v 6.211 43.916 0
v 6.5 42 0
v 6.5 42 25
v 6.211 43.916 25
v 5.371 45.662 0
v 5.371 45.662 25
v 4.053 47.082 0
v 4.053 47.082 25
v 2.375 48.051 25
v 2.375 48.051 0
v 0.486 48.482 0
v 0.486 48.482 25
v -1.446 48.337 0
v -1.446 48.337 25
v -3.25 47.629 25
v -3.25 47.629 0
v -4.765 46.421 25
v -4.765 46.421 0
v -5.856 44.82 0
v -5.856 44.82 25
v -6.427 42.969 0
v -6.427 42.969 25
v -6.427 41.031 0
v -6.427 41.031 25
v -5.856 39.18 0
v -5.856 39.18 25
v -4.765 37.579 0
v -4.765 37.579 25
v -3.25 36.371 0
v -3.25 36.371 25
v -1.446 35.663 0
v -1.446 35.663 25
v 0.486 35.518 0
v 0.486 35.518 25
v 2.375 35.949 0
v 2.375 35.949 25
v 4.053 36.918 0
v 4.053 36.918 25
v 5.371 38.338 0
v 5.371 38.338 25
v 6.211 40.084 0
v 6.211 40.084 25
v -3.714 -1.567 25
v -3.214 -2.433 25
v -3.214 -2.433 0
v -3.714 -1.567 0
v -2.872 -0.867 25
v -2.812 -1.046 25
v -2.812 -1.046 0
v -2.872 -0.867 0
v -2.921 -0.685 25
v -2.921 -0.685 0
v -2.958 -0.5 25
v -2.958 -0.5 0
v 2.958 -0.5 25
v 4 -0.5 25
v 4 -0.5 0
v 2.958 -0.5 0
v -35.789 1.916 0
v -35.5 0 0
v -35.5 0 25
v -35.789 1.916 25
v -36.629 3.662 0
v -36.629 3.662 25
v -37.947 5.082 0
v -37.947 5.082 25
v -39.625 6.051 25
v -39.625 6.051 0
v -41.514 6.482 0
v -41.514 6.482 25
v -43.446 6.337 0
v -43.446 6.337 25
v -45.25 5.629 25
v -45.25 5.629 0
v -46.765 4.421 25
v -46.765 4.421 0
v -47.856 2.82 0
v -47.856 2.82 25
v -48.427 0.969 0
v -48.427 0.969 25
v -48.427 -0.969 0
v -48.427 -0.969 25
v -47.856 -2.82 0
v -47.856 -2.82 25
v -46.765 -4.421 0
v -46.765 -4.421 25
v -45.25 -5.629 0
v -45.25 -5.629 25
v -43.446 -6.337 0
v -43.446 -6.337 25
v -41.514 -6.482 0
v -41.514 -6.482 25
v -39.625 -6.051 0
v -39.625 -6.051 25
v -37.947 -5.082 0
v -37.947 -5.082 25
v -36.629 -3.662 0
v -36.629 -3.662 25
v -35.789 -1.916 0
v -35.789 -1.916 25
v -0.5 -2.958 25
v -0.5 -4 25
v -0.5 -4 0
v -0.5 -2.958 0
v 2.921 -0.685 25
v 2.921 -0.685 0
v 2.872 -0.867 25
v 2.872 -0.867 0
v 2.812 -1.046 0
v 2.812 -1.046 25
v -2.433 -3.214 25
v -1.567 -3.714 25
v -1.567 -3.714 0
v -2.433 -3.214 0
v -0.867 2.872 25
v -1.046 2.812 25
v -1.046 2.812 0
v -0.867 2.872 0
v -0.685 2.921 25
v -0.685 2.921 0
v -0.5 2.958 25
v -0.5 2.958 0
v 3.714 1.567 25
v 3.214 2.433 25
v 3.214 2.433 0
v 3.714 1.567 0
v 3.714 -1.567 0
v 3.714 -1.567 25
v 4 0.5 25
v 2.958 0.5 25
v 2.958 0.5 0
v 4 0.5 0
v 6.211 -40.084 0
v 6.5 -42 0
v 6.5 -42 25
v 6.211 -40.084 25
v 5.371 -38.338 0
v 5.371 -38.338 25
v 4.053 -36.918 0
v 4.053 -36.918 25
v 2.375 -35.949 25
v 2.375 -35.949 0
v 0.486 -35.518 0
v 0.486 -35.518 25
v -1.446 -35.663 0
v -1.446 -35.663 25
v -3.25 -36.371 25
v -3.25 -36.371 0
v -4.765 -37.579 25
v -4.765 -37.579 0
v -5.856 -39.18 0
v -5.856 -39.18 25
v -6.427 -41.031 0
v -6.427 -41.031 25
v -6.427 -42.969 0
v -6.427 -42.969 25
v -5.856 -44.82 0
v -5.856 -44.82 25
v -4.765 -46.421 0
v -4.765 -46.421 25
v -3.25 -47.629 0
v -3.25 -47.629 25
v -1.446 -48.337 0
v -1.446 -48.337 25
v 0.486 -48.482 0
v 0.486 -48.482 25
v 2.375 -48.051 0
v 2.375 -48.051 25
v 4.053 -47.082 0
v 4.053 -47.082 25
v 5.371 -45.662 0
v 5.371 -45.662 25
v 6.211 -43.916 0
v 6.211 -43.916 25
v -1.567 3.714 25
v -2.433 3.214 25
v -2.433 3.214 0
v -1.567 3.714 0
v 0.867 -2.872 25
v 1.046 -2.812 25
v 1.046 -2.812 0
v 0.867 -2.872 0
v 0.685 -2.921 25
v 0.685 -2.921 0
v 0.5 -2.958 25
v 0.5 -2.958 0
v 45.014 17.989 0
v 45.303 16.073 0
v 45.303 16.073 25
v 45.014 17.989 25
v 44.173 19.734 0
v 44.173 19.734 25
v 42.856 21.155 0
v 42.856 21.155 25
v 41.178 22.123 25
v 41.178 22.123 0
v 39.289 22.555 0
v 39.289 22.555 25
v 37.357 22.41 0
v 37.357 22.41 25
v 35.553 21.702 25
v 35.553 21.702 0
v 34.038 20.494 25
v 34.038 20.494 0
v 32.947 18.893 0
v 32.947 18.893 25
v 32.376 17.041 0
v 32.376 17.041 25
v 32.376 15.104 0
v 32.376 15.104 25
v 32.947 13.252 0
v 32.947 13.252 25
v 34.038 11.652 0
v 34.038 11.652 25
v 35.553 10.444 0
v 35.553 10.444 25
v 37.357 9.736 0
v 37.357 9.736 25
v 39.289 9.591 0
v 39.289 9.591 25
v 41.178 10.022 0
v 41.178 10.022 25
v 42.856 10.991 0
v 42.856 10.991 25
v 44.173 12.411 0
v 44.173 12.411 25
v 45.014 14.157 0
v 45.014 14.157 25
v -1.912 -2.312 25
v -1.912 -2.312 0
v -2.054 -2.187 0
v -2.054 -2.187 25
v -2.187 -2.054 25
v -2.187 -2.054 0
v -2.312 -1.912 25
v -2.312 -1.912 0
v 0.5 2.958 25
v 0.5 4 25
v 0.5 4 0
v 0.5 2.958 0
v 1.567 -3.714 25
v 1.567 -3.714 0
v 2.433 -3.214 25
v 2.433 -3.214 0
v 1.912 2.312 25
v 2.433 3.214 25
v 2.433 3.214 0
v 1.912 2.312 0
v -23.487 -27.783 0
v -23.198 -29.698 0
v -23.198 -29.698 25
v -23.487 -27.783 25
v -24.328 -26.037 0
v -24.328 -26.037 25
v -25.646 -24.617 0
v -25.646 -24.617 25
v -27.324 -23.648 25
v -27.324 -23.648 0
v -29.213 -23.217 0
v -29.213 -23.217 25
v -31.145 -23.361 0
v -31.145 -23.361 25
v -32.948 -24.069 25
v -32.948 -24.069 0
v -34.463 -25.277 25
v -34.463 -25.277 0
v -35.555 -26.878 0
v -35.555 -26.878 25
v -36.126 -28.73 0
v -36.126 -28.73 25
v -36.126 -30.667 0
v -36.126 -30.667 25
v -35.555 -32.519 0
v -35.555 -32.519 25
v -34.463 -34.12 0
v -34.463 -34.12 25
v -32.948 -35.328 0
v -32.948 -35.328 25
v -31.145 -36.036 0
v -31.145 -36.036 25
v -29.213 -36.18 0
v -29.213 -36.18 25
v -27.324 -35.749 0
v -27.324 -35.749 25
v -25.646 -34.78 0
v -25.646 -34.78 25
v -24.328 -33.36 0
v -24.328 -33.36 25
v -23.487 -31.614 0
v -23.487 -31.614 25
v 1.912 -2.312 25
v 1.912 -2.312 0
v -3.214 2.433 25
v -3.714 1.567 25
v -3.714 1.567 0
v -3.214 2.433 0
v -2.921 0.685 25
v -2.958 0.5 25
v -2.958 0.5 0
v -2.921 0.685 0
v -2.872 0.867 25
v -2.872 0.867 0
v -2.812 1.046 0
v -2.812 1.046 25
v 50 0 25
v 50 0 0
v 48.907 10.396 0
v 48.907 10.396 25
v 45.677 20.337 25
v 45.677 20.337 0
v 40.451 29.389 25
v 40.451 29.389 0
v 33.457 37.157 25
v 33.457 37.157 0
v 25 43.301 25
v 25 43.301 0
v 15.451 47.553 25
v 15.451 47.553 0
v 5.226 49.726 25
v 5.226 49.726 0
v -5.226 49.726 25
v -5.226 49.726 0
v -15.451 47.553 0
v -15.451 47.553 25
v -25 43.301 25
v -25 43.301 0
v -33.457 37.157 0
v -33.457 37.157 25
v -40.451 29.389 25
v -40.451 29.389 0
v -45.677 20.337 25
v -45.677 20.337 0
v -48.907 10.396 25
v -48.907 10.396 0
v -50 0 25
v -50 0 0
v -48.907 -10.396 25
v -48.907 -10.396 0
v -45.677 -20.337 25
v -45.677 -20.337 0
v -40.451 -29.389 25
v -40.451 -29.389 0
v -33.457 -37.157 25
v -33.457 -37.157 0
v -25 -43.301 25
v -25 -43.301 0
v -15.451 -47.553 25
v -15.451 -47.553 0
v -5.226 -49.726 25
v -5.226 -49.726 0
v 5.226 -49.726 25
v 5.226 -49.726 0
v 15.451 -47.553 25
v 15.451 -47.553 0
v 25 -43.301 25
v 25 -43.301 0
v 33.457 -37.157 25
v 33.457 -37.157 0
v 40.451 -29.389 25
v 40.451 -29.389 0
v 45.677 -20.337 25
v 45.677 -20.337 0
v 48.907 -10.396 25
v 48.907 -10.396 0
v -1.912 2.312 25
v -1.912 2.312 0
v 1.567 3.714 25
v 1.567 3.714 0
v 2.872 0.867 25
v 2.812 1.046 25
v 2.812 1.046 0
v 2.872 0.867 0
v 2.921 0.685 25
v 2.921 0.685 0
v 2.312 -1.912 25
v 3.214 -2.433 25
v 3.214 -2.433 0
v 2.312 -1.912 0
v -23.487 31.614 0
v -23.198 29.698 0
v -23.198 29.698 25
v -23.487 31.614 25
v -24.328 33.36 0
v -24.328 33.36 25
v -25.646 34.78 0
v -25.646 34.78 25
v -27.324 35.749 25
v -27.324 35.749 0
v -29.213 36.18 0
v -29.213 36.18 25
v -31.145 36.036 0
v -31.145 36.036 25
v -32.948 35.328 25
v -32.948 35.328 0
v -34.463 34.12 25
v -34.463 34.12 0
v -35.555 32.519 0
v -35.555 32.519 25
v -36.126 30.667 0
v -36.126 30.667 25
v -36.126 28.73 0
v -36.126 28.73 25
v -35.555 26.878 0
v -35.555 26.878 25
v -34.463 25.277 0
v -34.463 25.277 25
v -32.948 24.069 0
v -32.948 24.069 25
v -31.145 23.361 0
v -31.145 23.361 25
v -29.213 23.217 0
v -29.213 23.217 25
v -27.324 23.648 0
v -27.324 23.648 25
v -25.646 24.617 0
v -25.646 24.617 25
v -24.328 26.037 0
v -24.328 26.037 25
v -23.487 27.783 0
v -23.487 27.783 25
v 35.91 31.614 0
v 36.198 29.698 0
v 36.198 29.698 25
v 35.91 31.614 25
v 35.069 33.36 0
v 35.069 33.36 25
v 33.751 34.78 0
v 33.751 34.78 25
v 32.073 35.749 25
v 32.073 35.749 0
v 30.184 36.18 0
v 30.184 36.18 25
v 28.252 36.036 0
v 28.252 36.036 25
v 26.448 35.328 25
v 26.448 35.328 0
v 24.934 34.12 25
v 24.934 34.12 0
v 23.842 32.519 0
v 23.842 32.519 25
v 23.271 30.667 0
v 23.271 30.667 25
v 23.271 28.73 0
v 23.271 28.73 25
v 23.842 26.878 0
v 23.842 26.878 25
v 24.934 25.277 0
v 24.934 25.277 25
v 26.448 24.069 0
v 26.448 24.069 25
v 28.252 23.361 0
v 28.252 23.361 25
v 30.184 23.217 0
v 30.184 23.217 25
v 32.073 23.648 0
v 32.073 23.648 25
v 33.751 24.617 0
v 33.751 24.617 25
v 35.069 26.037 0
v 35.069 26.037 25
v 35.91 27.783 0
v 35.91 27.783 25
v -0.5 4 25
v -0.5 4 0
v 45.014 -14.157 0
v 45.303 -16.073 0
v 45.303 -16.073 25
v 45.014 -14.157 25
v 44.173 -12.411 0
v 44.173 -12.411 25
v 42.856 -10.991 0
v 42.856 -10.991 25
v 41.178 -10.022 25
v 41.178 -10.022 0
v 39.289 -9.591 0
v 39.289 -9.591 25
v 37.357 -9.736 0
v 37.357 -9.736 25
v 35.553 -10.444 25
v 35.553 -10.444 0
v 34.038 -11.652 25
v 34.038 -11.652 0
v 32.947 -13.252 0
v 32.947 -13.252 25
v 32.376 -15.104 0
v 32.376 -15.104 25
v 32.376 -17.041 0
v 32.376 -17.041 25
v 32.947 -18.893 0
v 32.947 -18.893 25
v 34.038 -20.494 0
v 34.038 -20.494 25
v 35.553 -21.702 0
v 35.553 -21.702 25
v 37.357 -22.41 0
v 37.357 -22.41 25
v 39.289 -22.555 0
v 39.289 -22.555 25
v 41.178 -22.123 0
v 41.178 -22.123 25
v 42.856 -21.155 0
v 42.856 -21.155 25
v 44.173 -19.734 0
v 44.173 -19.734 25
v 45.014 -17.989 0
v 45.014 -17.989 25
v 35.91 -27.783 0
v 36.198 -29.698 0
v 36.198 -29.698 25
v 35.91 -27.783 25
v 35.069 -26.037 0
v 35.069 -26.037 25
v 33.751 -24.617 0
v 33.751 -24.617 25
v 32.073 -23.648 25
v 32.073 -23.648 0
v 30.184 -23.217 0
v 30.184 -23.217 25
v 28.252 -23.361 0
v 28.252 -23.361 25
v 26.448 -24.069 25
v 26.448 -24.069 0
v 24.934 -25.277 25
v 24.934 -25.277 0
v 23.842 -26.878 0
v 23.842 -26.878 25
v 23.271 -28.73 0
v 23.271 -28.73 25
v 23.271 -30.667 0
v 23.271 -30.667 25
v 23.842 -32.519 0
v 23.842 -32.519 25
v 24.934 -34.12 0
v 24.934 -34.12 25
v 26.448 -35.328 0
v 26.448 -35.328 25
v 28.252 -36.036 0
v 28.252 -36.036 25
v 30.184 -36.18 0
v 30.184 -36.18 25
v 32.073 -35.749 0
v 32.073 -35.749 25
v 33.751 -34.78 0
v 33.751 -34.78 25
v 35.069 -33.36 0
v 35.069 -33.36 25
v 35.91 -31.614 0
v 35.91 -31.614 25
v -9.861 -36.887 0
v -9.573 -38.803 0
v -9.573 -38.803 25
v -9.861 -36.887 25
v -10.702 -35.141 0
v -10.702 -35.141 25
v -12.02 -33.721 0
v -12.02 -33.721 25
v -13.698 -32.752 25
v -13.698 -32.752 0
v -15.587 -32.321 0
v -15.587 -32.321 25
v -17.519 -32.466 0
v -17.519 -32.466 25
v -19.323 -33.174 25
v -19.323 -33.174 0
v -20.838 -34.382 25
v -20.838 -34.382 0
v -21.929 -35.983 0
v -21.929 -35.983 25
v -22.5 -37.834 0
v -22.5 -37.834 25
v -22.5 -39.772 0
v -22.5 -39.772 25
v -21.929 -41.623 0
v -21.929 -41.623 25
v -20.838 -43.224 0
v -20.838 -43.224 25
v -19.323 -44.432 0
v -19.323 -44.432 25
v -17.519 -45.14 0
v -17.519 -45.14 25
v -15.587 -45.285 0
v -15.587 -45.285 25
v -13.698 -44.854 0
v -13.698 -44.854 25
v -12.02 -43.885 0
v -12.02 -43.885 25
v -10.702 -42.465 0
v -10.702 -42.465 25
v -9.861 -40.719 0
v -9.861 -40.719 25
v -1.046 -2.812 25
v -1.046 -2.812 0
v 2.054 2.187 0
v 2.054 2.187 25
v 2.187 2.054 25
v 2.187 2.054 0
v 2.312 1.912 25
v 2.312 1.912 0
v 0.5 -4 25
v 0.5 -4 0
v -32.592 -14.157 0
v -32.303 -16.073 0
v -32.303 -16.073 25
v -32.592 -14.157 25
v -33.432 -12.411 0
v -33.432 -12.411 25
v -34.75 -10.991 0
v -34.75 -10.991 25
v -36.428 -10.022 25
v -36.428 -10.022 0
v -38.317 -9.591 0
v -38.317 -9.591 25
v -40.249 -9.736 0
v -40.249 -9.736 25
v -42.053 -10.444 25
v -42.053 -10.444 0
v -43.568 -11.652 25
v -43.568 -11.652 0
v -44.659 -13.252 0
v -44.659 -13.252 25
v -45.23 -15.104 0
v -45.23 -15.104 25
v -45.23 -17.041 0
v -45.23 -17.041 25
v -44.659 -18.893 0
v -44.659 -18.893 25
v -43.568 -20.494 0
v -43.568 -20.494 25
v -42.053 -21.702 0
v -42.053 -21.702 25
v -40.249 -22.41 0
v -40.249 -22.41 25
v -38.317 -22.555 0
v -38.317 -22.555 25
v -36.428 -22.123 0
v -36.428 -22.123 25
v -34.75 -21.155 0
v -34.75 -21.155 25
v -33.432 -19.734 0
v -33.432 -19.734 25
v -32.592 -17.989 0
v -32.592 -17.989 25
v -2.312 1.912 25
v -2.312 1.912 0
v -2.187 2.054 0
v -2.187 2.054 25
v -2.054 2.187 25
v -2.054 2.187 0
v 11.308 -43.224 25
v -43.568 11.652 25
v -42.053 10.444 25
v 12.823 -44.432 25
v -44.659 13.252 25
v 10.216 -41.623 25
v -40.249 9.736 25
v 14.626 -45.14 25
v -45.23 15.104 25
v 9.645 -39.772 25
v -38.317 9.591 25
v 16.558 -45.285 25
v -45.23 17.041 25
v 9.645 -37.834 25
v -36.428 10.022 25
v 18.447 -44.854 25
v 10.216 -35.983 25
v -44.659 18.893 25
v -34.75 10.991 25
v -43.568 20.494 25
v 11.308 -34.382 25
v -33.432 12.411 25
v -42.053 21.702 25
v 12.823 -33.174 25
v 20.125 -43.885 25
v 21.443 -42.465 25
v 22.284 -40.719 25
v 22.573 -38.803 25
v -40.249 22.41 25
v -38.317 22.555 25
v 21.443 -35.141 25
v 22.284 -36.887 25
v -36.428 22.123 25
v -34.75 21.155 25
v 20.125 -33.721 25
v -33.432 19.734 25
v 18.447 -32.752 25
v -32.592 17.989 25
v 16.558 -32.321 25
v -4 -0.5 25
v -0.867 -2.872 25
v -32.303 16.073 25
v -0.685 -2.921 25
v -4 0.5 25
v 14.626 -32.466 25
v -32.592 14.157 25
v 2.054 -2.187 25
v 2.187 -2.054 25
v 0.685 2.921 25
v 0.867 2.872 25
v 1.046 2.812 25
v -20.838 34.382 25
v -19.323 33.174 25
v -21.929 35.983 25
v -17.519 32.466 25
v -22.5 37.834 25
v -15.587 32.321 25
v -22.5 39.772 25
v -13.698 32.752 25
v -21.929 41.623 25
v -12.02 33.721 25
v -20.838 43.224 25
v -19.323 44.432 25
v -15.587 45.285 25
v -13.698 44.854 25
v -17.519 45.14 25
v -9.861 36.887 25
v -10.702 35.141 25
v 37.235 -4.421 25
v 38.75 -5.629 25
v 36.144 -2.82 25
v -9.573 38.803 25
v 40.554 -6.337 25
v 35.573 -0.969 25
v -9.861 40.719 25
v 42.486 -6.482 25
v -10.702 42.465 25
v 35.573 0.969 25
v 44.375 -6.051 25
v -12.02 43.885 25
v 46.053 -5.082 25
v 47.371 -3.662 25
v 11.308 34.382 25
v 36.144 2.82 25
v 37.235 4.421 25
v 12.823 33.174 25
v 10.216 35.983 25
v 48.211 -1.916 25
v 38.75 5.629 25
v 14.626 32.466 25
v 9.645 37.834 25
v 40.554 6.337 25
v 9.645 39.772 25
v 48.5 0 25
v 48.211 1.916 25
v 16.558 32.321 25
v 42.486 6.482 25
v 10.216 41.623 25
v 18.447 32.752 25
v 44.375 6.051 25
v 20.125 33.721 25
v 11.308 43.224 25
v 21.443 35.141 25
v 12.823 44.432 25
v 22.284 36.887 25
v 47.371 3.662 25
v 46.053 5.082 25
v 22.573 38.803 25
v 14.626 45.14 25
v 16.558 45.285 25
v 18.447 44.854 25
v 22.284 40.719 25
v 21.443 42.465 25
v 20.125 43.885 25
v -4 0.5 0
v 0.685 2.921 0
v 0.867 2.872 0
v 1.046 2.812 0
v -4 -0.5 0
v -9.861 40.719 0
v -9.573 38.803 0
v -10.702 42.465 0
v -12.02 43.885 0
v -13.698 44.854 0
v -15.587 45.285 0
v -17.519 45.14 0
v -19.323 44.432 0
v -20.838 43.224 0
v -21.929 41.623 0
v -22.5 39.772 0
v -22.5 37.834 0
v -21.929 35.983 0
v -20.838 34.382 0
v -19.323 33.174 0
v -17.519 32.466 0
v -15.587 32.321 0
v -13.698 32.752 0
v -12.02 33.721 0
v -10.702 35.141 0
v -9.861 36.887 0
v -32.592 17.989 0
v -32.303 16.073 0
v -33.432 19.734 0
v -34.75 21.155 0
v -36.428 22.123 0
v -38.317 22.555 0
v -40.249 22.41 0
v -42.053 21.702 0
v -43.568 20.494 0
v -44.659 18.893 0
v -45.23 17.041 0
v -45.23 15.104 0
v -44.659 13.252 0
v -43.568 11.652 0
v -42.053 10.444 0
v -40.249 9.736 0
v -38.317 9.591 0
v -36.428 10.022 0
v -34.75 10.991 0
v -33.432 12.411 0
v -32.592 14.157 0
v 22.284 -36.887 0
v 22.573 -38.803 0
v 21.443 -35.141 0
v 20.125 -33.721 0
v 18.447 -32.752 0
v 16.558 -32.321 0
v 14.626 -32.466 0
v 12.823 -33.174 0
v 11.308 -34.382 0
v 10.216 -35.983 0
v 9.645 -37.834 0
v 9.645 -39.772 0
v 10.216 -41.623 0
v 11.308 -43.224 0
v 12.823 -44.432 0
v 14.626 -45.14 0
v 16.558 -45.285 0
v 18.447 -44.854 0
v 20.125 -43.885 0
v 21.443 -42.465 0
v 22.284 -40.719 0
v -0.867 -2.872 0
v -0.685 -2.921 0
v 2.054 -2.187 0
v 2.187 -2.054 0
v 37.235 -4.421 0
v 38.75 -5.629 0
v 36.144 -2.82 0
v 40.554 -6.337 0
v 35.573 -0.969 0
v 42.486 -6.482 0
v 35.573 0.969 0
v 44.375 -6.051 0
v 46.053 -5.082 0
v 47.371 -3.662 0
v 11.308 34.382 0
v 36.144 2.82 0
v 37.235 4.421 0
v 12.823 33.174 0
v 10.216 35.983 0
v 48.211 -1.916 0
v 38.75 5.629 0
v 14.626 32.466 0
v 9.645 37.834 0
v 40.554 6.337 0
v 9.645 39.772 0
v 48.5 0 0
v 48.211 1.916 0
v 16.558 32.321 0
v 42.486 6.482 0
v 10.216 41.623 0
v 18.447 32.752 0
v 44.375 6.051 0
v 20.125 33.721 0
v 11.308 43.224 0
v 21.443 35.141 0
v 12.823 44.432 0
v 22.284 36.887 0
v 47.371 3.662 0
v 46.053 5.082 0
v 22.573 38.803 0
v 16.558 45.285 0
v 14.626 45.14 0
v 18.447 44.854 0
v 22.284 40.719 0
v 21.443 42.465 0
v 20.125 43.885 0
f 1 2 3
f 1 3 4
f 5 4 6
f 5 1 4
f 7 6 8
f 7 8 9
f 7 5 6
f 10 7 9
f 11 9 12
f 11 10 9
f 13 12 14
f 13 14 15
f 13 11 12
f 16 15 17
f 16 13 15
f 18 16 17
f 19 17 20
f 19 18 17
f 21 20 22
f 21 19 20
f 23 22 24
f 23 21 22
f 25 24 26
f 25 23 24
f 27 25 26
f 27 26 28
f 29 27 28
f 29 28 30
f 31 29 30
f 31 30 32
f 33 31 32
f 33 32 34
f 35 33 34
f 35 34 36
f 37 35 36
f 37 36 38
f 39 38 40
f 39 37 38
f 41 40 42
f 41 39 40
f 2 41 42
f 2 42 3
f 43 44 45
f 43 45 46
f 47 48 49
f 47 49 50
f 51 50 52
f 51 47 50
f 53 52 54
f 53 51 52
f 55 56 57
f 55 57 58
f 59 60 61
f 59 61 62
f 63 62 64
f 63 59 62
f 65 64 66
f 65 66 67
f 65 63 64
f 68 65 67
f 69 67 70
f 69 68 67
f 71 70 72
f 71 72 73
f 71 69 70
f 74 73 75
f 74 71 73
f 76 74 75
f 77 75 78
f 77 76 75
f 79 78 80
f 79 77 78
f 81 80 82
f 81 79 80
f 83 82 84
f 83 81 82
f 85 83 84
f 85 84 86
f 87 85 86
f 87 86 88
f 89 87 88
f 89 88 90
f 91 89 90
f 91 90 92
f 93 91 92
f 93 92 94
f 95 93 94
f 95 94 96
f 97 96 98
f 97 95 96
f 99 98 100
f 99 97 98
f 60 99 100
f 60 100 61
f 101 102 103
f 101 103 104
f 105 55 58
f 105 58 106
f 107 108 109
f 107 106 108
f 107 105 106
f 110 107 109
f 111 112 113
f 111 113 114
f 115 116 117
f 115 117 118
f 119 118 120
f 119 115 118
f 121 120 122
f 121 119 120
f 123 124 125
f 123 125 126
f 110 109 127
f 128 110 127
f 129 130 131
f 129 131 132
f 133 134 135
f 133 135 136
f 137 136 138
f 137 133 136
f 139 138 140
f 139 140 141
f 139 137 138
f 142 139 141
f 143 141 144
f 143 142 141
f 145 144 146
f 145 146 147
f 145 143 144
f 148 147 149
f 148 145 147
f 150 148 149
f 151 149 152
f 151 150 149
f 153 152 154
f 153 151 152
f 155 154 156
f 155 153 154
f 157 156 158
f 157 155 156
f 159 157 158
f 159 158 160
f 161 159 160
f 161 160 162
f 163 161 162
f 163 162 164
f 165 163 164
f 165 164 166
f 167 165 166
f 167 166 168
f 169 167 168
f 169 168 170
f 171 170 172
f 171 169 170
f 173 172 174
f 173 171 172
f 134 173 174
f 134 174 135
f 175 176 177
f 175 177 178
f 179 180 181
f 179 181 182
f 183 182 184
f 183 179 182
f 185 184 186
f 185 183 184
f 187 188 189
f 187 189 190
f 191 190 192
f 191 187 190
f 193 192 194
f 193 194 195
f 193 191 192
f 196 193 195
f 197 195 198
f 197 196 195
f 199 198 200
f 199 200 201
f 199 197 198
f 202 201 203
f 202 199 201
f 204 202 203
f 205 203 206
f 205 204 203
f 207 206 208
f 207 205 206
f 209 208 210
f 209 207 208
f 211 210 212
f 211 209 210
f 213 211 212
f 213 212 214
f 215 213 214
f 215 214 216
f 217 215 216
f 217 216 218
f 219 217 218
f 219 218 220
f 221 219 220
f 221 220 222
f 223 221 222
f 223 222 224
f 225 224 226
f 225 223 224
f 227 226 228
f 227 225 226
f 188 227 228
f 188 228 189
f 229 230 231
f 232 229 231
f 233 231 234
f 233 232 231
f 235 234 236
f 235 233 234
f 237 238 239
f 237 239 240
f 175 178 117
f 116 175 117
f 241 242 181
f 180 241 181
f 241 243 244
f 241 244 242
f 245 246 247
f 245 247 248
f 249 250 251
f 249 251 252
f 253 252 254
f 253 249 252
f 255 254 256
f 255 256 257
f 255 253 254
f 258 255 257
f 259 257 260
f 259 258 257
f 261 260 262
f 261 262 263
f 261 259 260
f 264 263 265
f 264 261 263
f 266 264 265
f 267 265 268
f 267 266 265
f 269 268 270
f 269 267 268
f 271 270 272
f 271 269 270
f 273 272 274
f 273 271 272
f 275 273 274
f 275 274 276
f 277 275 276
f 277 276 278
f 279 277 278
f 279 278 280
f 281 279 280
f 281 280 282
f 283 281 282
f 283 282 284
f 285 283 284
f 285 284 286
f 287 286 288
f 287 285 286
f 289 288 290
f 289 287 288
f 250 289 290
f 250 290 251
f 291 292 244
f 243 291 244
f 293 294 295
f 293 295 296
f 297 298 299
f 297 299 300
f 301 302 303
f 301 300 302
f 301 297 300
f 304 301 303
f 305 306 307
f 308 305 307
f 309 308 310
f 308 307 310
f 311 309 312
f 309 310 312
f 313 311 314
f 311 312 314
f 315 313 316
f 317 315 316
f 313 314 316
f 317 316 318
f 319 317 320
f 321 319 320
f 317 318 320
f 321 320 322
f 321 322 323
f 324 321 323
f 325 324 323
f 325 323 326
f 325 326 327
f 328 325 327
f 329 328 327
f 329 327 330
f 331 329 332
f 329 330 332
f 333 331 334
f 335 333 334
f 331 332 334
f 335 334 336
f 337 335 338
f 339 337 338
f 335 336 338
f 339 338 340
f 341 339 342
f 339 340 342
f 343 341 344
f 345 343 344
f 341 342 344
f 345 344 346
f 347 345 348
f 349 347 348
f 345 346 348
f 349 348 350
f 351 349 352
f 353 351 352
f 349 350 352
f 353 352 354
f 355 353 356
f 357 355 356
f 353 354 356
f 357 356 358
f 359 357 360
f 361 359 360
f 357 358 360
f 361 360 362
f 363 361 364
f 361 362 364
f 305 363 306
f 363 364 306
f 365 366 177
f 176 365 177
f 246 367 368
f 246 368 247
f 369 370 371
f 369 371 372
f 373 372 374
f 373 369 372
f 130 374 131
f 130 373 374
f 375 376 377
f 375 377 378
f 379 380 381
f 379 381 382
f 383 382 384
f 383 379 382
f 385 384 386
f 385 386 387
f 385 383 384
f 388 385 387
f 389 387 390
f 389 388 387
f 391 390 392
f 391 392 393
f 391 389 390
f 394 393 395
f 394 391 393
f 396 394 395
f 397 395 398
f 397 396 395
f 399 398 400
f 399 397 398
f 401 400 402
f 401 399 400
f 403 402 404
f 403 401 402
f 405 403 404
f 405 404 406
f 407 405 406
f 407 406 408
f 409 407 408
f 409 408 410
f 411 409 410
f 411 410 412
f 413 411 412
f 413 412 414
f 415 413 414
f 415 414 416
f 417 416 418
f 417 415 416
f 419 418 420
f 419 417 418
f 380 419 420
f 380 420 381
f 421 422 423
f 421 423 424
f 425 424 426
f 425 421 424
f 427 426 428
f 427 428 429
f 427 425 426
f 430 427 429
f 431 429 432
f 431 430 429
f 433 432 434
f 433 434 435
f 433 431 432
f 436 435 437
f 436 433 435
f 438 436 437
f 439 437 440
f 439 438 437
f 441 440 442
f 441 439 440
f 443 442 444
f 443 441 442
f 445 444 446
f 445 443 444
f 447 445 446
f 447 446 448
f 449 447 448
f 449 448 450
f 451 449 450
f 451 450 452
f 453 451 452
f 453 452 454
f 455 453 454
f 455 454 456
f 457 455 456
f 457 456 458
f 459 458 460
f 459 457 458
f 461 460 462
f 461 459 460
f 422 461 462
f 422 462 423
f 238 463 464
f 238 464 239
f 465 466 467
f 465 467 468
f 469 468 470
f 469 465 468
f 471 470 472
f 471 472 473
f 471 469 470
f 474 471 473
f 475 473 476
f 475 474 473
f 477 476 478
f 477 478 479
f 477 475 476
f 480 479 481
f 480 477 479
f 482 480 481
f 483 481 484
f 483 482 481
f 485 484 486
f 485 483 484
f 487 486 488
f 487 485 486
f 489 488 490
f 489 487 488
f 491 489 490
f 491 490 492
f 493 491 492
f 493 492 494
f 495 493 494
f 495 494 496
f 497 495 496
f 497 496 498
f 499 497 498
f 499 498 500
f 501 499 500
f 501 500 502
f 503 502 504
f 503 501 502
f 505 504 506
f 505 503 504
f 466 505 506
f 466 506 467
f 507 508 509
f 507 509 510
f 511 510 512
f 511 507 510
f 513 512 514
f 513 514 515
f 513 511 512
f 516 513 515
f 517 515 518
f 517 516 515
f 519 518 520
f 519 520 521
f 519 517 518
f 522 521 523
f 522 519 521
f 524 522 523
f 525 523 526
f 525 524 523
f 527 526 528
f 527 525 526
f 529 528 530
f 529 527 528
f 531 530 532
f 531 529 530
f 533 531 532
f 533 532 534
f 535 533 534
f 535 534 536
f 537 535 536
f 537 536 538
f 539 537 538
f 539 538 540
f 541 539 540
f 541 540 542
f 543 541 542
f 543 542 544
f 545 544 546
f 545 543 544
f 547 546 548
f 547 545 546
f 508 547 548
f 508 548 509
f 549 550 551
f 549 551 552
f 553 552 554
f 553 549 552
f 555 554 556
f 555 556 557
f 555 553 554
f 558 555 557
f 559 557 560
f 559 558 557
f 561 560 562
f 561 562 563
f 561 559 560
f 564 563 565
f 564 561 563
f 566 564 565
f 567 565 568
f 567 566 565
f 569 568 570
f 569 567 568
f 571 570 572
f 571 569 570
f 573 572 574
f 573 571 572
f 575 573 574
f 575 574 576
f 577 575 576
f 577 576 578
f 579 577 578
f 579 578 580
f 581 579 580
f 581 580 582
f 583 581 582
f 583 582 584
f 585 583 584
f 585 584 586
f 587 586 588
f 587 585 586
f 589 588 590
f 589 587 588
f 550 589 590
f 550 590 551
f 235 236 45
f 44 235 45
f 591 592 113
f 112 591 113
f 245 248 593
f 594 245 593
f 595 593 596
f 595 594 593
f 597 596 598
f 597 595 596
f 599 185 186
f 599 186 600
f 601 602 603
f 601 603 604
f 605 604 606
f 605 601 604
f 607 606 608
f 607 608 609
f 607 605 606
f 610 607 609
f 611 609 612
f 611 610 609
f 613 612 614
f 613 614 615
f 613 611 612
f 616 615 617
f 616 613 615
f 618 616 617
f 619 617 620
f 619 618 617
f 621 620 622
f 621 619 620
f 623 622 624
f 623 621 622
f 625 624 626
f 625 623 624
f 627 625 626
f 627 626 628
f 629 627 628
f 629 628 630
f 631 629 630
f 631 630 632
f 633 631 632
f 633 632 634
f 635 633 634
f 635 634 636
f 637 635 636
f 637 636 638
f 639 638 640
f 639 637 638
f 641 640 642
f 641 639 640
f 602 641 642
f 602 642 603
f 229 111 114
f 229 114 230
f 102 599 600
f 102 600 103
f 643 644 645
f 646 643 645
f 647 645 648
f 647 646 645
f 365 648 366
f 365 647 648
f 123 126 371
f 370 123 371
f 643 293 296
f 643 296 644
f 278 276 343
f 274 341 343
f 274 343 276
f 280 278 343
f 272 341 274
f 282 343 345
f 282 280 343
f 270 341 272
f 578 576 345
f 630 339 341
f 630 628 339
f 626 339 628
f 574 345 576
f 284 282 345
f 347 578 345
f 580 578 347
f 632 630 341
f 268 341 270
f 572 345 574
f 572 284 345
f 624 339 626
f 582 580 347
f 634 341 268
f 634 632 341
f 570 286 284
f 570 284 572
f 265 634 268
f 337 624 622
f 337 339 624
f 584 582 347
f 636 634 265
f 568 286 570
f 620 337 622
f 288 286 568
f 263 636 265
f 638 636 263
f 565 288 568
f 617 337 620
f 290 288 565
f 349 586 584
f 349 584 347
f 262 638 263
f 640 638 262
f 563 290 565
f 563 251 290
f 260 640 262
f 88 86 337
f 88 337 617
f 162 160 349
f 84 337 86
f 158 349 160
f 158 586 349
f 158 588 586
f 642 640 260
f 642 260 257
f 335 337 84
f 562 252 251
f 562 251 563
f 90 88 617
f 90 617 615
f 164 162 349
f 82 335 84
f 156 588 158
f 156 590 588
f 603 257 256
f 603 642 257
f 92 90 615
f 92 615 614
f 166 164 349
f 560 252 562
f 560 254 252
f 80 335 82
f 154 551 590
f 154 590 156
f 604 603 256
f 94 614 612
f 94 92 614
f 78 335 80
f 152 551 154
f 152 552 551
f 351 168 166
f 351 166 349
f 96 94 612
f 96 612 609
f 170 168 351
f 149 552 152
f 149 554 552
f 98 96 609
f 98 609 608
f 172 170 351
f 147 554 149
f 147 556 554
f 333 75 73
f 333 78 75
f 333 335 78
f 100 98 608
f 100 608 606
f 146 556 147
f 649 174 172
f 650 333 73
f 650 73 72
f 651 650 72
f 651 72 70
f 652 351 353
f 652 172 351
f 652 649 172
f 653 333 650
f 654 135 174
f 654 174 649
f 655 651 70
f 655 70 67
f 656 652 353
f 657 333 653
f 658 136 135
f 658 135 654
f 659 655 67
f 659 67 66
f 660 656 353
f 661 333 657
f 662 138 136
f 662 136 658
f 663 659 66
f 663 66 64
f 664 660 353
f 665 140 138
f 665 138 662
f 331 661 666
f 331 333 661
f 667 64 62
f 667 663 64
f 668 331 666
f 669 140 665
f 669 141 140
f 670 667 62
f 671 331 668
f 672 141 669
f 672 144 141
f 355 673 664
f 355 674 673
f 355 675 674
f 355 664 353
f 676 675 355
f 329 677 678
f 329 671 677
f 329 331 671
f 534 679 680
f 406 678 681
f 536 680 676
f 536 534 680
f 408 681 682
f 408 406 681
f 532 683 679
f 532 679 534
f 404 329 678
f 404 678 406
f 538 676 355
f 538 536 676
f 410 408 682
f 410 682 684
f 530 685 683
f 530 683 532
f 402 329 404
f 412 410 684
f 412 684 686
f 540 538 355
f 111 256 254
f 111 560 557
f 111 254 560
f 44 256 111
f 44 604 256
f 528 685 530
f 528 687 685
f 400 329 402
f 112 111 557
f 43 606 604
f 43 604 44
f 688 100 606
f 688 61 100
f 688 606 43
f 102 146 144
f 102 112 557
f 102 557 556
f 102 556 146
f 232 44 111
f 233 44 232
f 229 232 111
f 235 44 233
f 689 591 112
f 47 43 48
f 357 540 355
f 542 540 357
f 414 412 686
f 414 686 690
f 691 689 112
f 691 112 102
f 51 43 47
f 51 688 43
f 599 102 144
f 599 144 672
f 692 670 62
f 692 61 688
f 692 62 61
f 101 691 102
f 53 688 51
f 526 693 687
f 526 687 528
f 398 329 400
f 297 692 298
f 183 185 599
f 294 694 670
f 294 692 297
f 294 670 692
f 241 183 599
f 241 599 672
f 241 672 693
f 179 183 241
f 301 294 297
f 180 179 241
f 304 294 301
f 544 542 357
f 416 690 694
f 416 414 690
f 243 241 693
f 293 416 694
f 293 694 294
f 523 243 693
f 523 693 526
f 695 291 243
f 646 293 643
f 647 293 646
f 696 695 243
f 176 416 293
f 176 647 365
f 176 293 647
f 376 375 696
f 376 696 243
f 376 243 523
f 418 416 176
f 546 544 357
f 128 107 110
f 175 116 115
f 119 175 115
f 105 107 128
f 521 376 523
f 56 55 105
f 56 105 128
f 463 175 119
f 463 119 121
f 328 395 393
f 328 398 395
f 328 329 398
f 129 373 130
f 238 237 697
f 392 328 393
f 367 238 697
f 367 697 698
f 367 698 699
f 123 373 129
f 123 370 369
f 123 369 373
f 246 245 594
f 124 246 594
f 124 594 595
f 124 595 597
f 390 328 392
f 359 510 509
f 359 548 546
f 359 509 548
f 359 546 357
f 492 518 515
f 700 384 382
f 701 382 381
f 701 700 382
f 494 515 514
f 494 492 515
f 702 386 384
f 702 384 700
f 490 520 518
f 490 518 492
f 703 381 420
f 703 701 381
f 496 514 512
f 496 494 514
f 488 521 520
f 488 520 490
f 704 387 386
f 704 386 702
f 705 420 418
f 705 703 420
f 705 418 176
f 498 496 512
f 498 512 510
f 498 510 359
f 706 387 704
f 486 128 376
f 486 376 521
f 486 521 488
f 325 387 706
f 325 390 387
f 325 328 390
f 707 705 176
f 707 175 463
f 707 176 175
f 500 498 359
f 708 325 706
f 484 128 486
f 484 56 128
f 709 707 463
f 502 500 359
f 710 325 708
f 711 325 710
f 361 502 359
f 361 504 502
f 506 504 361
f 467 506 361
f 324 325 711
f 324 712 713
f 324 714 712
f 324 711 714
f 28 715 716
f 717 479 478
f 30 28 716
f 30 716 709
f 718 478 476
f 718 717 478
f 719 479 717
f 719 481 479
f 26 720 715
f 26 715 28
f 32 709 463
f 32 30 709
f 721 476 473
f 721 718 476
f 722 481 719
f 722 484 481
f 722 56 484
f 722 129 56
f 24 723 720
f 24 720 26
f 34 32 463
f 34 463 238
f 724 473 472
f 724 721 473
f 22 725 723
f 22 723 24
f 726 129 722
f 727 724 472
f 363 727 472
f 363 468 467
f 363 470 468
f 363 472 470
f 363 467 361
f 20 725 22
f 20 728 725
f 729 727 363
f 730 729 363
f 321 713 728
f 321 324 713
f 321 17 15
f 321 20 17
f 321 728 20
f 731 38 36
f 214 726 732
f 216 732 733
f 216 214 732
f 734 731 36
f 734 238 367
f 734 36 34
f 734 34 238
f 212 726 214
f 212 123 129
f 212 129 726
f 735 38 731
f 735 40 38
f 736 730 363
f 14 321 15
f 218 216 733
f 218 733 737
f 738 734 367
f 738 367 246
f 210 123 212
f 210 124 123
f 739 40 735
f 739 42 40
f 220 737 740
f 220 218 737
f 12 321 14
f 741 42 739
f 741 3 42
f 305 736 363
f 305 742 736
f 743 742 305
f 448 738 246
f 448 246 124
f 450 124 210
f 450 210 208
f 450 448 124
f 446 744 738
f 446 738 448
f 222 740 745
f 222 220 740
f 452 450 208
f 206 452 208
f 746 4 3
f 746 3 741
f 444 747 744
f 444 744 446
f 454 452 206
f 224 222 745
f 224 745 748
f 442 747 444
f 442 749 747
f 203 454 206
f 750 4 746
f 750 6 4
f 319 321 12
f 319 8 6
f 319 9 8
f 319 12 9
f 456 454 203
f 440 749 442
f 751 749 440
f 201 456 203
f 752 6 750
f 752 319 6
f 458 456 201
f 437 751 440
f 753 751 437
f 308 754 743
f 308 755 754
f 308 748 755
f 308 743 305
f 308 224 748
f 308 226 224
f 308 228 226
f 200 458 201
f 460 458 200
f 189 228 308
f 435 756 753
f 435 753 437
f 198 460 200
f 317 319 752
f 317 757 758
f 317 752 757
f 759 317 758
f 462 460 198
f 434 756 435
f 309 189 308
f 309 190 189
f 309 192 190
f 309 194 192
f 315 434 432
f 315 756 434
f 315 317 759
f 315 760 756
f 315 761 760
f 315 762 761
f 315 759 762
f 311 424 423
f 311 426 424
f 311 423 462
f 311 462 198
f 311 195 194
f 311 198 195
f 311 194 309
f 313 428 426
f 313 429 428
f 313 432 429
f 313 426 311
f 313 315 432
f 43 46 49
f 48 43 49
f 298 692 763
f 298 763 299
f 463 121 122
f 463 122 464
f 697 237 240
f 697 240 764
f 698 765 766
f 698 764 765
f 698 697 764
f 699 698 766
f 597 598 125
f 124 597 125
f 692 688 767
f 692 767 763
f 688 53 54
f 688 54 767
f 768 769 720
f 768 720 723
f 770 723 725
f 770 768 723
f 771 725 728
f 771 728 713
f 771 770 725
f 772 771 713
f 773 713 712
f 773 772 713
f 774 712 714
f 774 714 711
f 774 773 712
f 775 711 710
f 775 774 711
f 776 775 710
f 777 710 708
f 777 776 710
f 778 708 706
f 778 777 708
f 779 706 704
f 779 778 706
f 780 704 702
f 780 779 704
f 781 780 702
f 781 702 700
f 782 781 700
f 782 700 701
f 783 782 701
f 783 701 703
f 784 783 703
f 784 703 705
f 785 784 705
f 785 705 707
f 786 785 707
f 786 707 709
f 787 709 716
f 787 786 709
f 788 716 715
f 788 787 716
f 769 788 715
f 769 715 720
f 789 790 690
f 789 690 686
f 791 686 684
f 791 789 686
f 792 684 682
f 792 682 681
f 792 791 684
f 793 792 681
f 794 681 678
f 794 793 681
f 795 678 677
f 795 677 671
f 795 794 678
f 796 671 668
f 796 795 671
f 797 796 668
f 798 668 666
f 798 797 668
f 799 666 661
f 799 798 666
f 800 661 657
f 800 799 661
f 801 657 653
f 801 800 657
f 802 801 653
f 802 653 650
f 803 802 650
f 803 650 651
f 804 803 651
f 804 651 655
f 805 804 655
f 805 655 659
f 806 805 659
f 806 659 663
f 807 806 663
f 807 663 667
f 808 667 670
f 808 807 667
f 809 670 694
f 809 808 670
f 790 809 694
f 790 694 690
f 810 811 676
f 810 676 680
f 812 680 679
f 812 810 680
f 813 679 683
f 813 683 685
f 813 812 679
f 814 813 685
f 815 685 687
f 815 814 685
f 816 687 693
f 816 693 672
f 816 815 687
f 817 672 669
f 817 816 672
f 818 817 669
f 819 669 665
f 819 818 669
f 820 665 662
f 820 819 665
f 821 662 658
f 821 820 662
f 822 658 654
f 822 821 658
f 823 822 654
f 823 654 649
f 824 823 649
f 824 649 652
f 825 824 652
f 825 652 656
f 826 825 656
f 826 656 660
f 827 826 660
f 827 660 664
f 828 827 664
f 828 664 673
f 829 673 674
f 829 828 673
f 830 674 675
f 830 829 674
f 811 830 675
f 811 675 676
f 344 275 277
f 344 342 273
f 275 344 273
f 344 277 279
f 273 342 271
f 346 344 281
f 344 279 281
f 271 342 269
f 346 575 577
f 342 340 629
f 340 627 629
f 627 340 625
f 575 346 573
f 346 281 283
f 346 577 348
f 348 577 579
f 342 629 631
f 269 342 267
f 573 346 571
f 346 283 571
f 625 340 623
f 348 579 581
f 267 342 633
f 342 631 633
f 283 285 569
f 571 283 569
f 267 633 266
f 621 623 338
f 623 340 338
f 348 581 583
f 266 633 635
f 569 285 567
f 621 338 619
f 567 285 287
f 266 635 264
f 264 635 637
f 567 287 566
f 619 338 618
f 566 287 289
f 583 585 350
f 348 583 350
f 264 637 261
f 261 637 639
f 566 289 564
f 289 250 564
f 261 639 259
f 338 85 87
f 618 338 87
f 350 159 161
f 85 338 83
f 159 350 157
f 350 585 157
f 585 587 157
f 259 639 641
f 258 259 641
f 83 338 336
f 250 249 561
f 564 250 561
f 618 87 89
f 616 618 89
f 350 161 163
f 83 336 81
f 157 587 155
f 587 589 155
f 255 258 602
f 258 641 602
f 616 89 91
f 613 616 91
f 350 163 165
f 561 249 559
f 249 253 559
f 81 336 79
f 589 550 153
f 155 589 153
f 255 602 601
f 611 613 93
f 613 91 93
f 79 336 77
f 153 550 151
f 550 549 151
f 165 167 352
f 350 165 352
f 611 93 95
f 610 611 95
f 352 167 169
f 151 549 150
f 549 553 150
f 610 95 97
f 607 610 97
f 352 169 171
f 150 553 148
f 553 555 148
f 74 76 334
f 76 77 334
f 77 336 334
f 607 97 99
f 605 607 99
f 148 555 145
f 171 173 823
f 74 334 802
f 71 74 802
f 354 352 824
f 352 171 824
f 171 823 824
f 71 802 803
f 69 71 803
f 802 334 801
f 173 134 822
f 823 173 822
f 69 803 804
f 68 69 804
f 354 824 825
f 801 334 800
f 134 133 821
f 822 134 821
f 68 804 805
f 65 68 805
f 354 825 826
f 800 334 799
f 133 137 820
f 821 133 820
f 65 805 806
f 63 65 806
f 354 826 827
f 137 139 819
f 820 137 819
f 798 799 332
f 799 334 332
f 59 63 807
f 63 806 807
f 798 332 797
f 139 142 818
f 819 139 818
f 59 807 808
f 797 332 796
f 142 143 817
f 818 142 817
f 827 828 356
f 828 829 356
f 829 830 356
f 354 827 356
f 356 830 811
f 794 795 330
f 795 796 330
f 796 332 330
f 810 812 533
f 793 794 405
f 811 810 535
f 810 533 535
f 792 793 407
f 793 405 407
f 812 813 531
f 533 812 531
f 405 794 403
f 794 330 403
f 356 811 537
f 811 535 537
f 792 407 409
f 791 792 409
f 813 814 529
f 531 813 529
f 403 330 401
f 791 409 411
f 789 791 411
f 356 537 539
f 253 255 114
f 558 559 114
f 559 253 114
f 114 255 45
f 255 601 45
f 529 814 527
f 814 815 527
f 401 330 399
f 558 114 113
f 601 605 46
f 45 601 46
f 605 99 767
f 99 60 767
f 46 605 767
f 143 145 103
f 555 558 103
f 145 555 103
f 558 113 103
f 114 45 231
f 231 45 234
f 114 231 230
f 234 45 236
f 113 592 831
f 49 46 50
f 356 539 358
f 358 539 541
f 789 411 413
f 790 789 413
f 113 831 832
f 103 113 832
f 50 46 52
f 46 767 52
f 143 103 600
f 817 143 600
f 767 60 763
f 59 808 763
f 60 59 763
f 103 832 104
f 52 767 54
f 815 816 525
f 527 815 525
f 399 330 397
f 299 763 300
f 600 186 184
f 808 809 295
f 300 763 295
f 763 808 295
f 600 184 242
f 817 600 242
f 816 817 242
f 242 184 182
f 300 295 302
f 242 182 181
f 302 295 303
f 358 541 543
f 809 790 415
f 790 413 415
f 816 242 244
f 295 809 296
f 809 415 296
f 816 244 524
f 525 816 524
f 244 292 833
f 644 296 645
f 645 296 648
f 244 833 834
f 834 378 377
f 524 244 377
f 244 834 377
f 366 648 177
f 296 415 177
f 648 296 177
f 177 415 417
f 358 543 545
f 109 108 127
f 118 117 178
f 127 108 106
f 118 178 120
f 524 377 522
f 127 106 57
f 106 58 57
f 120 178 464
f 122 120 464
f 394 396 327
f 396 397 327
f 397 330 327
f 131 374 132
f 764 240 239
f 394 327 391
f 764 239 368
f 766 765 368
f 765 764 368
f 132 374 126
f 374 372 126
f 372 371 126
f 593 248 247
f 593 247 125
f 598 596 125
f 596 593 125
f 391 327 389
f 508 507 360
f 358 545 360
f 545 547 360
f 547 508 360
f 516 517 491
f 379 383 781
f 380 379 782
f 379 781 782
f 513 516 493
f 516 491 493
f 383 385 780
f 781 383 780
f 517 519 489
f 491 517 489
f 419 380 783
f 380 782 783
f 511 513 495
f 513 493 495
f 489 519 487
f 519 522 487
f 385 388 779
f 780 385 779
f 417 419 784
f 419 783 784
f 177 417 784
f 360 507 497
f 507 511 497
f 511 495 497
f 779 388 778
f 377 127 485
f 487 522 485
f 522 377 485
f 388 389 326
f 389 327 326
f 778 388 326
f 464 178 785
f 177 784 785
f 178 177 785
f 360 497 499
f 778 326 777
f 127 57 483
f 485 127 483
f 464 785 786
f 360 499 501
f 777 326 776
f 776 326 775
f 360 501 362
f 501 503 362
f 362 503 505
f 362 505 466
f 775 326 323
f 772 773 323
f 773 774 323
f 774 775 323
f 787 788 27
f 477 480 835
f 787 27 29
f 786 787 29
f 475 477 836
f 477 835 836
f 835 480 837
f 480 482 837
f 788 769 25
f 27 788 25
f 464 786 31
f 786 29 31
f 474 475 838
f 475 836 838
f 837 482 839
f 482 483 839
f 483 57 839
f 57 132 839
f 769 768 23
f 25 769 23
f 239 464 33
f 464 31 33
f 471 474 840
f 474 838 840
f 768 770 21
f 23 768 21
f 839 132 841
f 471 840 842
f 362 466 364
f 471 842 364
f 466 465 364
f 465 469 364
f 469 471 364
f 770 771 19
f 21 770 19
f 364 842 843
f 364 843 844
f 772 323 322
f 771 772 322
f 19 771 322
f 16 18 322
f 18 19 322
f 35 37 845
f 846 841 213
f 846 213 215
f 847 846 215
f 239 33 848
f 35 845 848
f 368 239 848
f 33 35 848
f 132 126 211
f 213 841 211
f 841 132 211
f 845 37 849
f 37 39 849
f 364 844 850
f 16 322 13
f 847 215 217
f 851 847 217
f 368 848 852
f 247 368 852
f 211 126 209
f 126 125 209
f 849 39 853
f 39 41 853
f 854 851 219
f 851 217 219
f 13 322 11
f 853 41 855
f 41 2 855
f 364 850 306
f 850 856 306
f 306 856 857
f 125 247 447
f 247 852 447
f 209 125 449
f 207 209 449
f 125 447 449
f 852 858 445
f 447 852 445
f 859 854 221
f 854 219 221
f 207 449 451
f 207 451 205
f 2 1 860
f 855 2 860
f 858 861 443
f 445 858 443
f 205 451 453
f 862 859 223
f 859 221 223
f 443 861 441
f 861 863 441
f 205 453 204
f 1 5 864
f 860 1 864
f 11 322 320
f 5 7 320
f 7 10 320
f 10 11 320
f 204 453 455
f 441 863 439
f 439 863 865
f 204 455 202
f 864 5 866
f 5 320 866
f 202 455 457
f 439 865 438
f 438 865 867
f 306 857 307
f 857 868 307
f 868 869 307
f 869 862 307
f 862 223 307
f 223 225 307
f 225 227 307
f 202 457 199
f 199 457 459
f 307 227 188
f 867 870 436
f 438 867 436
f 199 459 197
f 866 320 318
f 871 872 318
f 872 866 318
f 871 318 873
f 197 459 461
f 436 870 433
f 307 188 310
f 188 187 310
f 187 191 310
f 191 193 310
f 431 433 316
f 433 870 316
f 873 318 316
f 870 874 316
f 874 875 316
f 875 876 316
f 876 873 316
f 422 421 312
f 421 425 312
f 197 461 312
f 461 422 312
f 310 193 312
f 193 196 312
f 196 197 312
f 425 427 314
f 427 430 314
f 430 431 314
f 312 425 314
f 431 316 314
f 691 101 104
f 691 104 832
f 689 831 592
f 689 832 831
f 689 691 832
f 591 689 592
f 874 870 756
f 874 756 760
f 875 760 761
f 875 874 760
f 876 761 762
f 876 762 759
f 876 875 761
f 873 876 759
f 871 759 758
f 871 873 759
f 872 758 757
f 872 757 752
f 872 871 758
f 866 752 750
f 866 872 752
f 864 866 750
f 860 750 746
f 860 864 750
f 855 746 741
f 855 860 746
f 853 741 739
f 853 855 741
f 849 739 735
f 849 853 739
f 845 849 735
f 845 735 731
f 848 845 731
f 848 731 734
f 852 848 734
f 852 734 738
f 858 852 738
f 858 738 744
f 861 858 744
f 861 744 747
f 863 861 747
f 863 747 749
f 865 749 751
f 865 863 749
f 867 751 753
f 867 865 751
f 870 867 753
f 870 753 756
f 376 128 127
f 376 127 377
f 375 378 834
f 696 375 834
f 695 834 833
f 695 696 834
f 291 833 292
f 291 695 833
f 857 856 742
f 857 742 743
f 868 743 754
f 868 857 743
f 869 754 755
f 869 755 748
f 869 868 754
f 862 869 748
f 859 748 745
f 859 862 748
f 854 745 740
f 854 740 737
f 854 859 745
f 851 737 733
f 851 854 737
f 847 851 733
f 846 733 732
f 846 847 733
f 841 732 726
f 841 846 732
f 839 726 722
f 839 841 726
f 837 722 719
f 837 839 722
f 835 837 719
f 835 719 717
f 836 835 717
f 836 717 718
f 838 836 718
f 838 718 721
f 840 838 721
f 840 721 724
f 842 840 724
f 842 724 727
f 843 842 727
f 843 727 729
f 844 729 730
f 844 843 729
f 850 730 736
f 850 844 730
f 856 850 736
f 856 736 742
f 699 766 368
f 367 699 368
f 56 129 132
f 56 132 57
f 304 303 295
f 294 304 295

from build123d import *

# Parameters (mm, degrees)
SKETCH2_R           = 50
SKETCH2_R_2         = 6.5
BOSS_EXTRUDE1_DEPTH = 25
CUT_EXTRUDE1_DEPTH  = 76


with BuildPart() as part:
    # Sketch2 → Boss-Extrude1 (new body)
    with BuildSketch(Plane(origin=(0, 0, 0), x_dir=(0, 1, 0), z_dir=(0, 0, 1))):
        with Locations(Location((0, 0, 0), (0, 0, 270))):
            Circle(SKETCH2_R)
        with Locations(Location((0, 42, 0), (0, 0, 270))):
            Circle(SKETCH2_R_2, mode=Mode.SUBTRACT)
        with Locations(Location((29.69848481, 29.69848481, 0), (0, 0, 270))):
            Circle(SKETCH2_R_2, mode=Mode.SUBTRACT)
        with Locations(Location((42, 0, 0), (0, 0, 270))):
            Circle(SKETCH2_R_2, mode=Mode.SUBTRACT)
        with Locations(Location((29.69848481, -29.69848481, 0), (0, 0, 270))):
            Circle(SKETCH2_R_2, mode=Mode.SUBTRACT)
        with Locations(Location((0, -42, 0), (0, 0, 270))):
            Circle(SKETCH2_R_2, mode=Mode.SUBTRACT)
        with Locations(Location((-29.69848481, -29.69848481, 0), (0, 0, 270))):
            Circle(SKETCH2_R_2, mode=Mode.SUBTRACT)
        with Locations(Location((-42, 0, 0), (0, 0, 270))):
            Circle(SKETCH2_R_2, mode=Mode.SUBTRACT)
        with Locations(Location((-29.69848481, 29.69848481, 0), (0, 0, 270))):
            Circle(SKETCH2_R_2, mode=Mode.SUBTRACT)
        with Locations(Location((-38.802940365, 16.072704159, 0), (0, 0, 270))):
            Circle(SKETCH2_R_2, mode=Mode.SUBTRACT)
        with Locations(Location((-16.072704159, 38.802940365, 0), (0, 0, 270))):
            Circle(SKETCH2_R_2, mode=Mode.SUBTRACT)
        with Locations(Location((16.072704159, 38.802940365, 0), (0, 0, 270))):
            Circle(SKETCH2_R_2, mode=Mode.SUBTRACT)
        with Locations(Location((38.802940365, 16.072704159, 0), (0, 0, 270))):
            Circle(SKETCH2_R_2, mode=Mode.SUBTRACT)
        with Locations(Location((38.802940365, -16.072704159, 0), (0, 0, 270))):
            Circle(SKETCH2_R_2, mode=Mode.SUBTRACT)
        with Locations(Location((16.072704159, -38.802940365, 0), (0, 0, 270))):
            Circle(SKETCH2_R_2, mode=Mode.SUBTRACT)
        with Locations(Location((-16.072704159, -38.802940365, 0), (0, 0, 270))):
            Circle(SKETCH2_R_2, mode=Mode.SUBTRACT)
        with Locations(Location((-38.802940365, -16.072704159, 0), (0, 0, 270))):
            Circle(SKETCH2_R_2, mode=Mode.SUBTRACT)
    extrude(amount=BOSS_EXTRUDE1_DEPTH)

    # Sketch4 → Cut-Extrude1 (cut, through all)
    with BuildSketch(Plane.XY.offset(25)):
        with BuildLine():
            Line((-0.5, 4), (0.5, 4))
            Line((0.5, 4), (0.5, 2.958039892))
            ThreePointArc((0.5, 2.958039892), (0.776457135, 2.897777479), (1.046007244, 2.811737691))
            Line((1.046007244, 2.811737691), (1.566987298, 3.714101615))
            Line((1.566987298, 3.714101615), (2.433012702, 3.214101615))
            Line((2.433012702, 3.214101615), (1.912032648, 2.311737691))
            ThreePointArc((1.912032648, 2.311737691), (2.121320344, 2.121320344), (2.311737691, 1.912032648))
            Line((2.311737691, 1.912032648), (3.214101615, 2.433012702))
            Line((3.214101615, 2.433012702), (3.714101615, 1.566987298))
            Line((3.714101615, 1.566987298), (2.811737691, 1.046007244))
            ThreePointArc((2.811737691, 1.046007244), (2.897777479, 0.776457135), (2.958039892, 0.5))
            Line((2.958039892, 0.5), (4, 0.5))
            Line((4, 0.5), (4, -0.5))
            Line((4, -0.5), (2.958039892, -0.5))
            ThreePointArc((2.958039892, -0.5), (2.897777479, -0.776457135), (2.811737691, -1.046007244))
            Line((2.811737691, -1.046007244), (3.714101615, -1.566987298))
            Line((3.714101615, -1.566987298), (3.214101615, -2.433012702))
            Line((3.214101615, -2.433012702), (2.311737691, -1.912032648))
            ThreePointArc((2.311737691, -1.912032648), (2.121320344, -2.121320344), (1.912032648, -2.311737691))
            Line((1.912032648, -2.311737691), (2.433012702, -3.214101615))
            Line((2.433012702, -3.214101615), (1.566987298, -3.714101615))
            Line((1.566987298, -3.714101615), (1.046007244, -2.811737691))
            ThreePointArc((1.046007244, -2.811737691), (0.776457135, -2.897777479), (0.5, -2.958039892))
            Line((0.5, -2.958039892), (0.5, -4))
            Line((0.5, -4), (-0.5, -4))
            Line((-0.5, -4), (-0.5, -2.958039892))
            ThreePointArc((-0.5, -2.958039892), (-0.776457135, -2.897777479), (-1.046007244, -2.811737691))
            Line((-1.046007244, -2.811737691), (-1.566987298, -3.714101615))
            Line((-1.566987298, -3.714101615), (-2.433012702, -3.214101615))
            Line((-2.433012702, -3.214101615), (-1.912032648, -2.311737691))
            ThreePointArc((-1.912032648, -2.311737691), (-2.121320344, -2.121320344), (-2.311737691, -1.912032648))
            Line((-2.311737691, -1.912032648), (-3.214101615, -2.433012702))
            Line((-3.214101615, -2.433012702), (-3.714101615, -1.566987298))
            Line((-3.714101615, -1.566987298), (-2.811737691, -1.046007244))
            ThreePointArc((-2.811737691, -1.046007244), (-2.897777479, -0.776457135), (-2.958039892, -0.5))
            Line((-2.958039892, -0.5), (-4, -0.5))
            Line((-4, -0.5), (-4, 0.5))
            Line((-4, 0.5), (-2.958039892, 0.5))
            ThreePointArc((-2.958039892, 0.5), (-2.897777479, 0.776457135), (-2.811737691, 1.046007244))
            Line((-2.811737691, 1.046007244), (-3.714101615, 1.566987298))
            Line((-3.714101615, 1.566987298), (-3.214101615, 2.433012702))
            Line((-3.214101615, 2.433012702), (-2.311737691, 1.912032648))
            ThreePointArc((-2.311737691, 1.912032648), (-2.121320344, 2.121320344), (-1.912032648, 2.311737691))
            Line((-1.912032648, 2.311737691), (-2.433012702, 3.214101615))
            Line((-2.433012702, 3.214101615), (-1.566987298, 3.714101615))
            Line((-1.566987298, 3.714101615), (-1.046007244, 2.811737691))
            ThreePointArc((-1.046007244, 2.811737691), (-0.776457135, 2.897777479), (-0.5, 2.958039892))
            Line((-0.5, 2.958039892), (-0.5, 4))
        make_face()
    extrude(amount=-CUT_EXTRUDE1_DEPTH, mode=Mode.SUBTRACT)


solid = part.part
